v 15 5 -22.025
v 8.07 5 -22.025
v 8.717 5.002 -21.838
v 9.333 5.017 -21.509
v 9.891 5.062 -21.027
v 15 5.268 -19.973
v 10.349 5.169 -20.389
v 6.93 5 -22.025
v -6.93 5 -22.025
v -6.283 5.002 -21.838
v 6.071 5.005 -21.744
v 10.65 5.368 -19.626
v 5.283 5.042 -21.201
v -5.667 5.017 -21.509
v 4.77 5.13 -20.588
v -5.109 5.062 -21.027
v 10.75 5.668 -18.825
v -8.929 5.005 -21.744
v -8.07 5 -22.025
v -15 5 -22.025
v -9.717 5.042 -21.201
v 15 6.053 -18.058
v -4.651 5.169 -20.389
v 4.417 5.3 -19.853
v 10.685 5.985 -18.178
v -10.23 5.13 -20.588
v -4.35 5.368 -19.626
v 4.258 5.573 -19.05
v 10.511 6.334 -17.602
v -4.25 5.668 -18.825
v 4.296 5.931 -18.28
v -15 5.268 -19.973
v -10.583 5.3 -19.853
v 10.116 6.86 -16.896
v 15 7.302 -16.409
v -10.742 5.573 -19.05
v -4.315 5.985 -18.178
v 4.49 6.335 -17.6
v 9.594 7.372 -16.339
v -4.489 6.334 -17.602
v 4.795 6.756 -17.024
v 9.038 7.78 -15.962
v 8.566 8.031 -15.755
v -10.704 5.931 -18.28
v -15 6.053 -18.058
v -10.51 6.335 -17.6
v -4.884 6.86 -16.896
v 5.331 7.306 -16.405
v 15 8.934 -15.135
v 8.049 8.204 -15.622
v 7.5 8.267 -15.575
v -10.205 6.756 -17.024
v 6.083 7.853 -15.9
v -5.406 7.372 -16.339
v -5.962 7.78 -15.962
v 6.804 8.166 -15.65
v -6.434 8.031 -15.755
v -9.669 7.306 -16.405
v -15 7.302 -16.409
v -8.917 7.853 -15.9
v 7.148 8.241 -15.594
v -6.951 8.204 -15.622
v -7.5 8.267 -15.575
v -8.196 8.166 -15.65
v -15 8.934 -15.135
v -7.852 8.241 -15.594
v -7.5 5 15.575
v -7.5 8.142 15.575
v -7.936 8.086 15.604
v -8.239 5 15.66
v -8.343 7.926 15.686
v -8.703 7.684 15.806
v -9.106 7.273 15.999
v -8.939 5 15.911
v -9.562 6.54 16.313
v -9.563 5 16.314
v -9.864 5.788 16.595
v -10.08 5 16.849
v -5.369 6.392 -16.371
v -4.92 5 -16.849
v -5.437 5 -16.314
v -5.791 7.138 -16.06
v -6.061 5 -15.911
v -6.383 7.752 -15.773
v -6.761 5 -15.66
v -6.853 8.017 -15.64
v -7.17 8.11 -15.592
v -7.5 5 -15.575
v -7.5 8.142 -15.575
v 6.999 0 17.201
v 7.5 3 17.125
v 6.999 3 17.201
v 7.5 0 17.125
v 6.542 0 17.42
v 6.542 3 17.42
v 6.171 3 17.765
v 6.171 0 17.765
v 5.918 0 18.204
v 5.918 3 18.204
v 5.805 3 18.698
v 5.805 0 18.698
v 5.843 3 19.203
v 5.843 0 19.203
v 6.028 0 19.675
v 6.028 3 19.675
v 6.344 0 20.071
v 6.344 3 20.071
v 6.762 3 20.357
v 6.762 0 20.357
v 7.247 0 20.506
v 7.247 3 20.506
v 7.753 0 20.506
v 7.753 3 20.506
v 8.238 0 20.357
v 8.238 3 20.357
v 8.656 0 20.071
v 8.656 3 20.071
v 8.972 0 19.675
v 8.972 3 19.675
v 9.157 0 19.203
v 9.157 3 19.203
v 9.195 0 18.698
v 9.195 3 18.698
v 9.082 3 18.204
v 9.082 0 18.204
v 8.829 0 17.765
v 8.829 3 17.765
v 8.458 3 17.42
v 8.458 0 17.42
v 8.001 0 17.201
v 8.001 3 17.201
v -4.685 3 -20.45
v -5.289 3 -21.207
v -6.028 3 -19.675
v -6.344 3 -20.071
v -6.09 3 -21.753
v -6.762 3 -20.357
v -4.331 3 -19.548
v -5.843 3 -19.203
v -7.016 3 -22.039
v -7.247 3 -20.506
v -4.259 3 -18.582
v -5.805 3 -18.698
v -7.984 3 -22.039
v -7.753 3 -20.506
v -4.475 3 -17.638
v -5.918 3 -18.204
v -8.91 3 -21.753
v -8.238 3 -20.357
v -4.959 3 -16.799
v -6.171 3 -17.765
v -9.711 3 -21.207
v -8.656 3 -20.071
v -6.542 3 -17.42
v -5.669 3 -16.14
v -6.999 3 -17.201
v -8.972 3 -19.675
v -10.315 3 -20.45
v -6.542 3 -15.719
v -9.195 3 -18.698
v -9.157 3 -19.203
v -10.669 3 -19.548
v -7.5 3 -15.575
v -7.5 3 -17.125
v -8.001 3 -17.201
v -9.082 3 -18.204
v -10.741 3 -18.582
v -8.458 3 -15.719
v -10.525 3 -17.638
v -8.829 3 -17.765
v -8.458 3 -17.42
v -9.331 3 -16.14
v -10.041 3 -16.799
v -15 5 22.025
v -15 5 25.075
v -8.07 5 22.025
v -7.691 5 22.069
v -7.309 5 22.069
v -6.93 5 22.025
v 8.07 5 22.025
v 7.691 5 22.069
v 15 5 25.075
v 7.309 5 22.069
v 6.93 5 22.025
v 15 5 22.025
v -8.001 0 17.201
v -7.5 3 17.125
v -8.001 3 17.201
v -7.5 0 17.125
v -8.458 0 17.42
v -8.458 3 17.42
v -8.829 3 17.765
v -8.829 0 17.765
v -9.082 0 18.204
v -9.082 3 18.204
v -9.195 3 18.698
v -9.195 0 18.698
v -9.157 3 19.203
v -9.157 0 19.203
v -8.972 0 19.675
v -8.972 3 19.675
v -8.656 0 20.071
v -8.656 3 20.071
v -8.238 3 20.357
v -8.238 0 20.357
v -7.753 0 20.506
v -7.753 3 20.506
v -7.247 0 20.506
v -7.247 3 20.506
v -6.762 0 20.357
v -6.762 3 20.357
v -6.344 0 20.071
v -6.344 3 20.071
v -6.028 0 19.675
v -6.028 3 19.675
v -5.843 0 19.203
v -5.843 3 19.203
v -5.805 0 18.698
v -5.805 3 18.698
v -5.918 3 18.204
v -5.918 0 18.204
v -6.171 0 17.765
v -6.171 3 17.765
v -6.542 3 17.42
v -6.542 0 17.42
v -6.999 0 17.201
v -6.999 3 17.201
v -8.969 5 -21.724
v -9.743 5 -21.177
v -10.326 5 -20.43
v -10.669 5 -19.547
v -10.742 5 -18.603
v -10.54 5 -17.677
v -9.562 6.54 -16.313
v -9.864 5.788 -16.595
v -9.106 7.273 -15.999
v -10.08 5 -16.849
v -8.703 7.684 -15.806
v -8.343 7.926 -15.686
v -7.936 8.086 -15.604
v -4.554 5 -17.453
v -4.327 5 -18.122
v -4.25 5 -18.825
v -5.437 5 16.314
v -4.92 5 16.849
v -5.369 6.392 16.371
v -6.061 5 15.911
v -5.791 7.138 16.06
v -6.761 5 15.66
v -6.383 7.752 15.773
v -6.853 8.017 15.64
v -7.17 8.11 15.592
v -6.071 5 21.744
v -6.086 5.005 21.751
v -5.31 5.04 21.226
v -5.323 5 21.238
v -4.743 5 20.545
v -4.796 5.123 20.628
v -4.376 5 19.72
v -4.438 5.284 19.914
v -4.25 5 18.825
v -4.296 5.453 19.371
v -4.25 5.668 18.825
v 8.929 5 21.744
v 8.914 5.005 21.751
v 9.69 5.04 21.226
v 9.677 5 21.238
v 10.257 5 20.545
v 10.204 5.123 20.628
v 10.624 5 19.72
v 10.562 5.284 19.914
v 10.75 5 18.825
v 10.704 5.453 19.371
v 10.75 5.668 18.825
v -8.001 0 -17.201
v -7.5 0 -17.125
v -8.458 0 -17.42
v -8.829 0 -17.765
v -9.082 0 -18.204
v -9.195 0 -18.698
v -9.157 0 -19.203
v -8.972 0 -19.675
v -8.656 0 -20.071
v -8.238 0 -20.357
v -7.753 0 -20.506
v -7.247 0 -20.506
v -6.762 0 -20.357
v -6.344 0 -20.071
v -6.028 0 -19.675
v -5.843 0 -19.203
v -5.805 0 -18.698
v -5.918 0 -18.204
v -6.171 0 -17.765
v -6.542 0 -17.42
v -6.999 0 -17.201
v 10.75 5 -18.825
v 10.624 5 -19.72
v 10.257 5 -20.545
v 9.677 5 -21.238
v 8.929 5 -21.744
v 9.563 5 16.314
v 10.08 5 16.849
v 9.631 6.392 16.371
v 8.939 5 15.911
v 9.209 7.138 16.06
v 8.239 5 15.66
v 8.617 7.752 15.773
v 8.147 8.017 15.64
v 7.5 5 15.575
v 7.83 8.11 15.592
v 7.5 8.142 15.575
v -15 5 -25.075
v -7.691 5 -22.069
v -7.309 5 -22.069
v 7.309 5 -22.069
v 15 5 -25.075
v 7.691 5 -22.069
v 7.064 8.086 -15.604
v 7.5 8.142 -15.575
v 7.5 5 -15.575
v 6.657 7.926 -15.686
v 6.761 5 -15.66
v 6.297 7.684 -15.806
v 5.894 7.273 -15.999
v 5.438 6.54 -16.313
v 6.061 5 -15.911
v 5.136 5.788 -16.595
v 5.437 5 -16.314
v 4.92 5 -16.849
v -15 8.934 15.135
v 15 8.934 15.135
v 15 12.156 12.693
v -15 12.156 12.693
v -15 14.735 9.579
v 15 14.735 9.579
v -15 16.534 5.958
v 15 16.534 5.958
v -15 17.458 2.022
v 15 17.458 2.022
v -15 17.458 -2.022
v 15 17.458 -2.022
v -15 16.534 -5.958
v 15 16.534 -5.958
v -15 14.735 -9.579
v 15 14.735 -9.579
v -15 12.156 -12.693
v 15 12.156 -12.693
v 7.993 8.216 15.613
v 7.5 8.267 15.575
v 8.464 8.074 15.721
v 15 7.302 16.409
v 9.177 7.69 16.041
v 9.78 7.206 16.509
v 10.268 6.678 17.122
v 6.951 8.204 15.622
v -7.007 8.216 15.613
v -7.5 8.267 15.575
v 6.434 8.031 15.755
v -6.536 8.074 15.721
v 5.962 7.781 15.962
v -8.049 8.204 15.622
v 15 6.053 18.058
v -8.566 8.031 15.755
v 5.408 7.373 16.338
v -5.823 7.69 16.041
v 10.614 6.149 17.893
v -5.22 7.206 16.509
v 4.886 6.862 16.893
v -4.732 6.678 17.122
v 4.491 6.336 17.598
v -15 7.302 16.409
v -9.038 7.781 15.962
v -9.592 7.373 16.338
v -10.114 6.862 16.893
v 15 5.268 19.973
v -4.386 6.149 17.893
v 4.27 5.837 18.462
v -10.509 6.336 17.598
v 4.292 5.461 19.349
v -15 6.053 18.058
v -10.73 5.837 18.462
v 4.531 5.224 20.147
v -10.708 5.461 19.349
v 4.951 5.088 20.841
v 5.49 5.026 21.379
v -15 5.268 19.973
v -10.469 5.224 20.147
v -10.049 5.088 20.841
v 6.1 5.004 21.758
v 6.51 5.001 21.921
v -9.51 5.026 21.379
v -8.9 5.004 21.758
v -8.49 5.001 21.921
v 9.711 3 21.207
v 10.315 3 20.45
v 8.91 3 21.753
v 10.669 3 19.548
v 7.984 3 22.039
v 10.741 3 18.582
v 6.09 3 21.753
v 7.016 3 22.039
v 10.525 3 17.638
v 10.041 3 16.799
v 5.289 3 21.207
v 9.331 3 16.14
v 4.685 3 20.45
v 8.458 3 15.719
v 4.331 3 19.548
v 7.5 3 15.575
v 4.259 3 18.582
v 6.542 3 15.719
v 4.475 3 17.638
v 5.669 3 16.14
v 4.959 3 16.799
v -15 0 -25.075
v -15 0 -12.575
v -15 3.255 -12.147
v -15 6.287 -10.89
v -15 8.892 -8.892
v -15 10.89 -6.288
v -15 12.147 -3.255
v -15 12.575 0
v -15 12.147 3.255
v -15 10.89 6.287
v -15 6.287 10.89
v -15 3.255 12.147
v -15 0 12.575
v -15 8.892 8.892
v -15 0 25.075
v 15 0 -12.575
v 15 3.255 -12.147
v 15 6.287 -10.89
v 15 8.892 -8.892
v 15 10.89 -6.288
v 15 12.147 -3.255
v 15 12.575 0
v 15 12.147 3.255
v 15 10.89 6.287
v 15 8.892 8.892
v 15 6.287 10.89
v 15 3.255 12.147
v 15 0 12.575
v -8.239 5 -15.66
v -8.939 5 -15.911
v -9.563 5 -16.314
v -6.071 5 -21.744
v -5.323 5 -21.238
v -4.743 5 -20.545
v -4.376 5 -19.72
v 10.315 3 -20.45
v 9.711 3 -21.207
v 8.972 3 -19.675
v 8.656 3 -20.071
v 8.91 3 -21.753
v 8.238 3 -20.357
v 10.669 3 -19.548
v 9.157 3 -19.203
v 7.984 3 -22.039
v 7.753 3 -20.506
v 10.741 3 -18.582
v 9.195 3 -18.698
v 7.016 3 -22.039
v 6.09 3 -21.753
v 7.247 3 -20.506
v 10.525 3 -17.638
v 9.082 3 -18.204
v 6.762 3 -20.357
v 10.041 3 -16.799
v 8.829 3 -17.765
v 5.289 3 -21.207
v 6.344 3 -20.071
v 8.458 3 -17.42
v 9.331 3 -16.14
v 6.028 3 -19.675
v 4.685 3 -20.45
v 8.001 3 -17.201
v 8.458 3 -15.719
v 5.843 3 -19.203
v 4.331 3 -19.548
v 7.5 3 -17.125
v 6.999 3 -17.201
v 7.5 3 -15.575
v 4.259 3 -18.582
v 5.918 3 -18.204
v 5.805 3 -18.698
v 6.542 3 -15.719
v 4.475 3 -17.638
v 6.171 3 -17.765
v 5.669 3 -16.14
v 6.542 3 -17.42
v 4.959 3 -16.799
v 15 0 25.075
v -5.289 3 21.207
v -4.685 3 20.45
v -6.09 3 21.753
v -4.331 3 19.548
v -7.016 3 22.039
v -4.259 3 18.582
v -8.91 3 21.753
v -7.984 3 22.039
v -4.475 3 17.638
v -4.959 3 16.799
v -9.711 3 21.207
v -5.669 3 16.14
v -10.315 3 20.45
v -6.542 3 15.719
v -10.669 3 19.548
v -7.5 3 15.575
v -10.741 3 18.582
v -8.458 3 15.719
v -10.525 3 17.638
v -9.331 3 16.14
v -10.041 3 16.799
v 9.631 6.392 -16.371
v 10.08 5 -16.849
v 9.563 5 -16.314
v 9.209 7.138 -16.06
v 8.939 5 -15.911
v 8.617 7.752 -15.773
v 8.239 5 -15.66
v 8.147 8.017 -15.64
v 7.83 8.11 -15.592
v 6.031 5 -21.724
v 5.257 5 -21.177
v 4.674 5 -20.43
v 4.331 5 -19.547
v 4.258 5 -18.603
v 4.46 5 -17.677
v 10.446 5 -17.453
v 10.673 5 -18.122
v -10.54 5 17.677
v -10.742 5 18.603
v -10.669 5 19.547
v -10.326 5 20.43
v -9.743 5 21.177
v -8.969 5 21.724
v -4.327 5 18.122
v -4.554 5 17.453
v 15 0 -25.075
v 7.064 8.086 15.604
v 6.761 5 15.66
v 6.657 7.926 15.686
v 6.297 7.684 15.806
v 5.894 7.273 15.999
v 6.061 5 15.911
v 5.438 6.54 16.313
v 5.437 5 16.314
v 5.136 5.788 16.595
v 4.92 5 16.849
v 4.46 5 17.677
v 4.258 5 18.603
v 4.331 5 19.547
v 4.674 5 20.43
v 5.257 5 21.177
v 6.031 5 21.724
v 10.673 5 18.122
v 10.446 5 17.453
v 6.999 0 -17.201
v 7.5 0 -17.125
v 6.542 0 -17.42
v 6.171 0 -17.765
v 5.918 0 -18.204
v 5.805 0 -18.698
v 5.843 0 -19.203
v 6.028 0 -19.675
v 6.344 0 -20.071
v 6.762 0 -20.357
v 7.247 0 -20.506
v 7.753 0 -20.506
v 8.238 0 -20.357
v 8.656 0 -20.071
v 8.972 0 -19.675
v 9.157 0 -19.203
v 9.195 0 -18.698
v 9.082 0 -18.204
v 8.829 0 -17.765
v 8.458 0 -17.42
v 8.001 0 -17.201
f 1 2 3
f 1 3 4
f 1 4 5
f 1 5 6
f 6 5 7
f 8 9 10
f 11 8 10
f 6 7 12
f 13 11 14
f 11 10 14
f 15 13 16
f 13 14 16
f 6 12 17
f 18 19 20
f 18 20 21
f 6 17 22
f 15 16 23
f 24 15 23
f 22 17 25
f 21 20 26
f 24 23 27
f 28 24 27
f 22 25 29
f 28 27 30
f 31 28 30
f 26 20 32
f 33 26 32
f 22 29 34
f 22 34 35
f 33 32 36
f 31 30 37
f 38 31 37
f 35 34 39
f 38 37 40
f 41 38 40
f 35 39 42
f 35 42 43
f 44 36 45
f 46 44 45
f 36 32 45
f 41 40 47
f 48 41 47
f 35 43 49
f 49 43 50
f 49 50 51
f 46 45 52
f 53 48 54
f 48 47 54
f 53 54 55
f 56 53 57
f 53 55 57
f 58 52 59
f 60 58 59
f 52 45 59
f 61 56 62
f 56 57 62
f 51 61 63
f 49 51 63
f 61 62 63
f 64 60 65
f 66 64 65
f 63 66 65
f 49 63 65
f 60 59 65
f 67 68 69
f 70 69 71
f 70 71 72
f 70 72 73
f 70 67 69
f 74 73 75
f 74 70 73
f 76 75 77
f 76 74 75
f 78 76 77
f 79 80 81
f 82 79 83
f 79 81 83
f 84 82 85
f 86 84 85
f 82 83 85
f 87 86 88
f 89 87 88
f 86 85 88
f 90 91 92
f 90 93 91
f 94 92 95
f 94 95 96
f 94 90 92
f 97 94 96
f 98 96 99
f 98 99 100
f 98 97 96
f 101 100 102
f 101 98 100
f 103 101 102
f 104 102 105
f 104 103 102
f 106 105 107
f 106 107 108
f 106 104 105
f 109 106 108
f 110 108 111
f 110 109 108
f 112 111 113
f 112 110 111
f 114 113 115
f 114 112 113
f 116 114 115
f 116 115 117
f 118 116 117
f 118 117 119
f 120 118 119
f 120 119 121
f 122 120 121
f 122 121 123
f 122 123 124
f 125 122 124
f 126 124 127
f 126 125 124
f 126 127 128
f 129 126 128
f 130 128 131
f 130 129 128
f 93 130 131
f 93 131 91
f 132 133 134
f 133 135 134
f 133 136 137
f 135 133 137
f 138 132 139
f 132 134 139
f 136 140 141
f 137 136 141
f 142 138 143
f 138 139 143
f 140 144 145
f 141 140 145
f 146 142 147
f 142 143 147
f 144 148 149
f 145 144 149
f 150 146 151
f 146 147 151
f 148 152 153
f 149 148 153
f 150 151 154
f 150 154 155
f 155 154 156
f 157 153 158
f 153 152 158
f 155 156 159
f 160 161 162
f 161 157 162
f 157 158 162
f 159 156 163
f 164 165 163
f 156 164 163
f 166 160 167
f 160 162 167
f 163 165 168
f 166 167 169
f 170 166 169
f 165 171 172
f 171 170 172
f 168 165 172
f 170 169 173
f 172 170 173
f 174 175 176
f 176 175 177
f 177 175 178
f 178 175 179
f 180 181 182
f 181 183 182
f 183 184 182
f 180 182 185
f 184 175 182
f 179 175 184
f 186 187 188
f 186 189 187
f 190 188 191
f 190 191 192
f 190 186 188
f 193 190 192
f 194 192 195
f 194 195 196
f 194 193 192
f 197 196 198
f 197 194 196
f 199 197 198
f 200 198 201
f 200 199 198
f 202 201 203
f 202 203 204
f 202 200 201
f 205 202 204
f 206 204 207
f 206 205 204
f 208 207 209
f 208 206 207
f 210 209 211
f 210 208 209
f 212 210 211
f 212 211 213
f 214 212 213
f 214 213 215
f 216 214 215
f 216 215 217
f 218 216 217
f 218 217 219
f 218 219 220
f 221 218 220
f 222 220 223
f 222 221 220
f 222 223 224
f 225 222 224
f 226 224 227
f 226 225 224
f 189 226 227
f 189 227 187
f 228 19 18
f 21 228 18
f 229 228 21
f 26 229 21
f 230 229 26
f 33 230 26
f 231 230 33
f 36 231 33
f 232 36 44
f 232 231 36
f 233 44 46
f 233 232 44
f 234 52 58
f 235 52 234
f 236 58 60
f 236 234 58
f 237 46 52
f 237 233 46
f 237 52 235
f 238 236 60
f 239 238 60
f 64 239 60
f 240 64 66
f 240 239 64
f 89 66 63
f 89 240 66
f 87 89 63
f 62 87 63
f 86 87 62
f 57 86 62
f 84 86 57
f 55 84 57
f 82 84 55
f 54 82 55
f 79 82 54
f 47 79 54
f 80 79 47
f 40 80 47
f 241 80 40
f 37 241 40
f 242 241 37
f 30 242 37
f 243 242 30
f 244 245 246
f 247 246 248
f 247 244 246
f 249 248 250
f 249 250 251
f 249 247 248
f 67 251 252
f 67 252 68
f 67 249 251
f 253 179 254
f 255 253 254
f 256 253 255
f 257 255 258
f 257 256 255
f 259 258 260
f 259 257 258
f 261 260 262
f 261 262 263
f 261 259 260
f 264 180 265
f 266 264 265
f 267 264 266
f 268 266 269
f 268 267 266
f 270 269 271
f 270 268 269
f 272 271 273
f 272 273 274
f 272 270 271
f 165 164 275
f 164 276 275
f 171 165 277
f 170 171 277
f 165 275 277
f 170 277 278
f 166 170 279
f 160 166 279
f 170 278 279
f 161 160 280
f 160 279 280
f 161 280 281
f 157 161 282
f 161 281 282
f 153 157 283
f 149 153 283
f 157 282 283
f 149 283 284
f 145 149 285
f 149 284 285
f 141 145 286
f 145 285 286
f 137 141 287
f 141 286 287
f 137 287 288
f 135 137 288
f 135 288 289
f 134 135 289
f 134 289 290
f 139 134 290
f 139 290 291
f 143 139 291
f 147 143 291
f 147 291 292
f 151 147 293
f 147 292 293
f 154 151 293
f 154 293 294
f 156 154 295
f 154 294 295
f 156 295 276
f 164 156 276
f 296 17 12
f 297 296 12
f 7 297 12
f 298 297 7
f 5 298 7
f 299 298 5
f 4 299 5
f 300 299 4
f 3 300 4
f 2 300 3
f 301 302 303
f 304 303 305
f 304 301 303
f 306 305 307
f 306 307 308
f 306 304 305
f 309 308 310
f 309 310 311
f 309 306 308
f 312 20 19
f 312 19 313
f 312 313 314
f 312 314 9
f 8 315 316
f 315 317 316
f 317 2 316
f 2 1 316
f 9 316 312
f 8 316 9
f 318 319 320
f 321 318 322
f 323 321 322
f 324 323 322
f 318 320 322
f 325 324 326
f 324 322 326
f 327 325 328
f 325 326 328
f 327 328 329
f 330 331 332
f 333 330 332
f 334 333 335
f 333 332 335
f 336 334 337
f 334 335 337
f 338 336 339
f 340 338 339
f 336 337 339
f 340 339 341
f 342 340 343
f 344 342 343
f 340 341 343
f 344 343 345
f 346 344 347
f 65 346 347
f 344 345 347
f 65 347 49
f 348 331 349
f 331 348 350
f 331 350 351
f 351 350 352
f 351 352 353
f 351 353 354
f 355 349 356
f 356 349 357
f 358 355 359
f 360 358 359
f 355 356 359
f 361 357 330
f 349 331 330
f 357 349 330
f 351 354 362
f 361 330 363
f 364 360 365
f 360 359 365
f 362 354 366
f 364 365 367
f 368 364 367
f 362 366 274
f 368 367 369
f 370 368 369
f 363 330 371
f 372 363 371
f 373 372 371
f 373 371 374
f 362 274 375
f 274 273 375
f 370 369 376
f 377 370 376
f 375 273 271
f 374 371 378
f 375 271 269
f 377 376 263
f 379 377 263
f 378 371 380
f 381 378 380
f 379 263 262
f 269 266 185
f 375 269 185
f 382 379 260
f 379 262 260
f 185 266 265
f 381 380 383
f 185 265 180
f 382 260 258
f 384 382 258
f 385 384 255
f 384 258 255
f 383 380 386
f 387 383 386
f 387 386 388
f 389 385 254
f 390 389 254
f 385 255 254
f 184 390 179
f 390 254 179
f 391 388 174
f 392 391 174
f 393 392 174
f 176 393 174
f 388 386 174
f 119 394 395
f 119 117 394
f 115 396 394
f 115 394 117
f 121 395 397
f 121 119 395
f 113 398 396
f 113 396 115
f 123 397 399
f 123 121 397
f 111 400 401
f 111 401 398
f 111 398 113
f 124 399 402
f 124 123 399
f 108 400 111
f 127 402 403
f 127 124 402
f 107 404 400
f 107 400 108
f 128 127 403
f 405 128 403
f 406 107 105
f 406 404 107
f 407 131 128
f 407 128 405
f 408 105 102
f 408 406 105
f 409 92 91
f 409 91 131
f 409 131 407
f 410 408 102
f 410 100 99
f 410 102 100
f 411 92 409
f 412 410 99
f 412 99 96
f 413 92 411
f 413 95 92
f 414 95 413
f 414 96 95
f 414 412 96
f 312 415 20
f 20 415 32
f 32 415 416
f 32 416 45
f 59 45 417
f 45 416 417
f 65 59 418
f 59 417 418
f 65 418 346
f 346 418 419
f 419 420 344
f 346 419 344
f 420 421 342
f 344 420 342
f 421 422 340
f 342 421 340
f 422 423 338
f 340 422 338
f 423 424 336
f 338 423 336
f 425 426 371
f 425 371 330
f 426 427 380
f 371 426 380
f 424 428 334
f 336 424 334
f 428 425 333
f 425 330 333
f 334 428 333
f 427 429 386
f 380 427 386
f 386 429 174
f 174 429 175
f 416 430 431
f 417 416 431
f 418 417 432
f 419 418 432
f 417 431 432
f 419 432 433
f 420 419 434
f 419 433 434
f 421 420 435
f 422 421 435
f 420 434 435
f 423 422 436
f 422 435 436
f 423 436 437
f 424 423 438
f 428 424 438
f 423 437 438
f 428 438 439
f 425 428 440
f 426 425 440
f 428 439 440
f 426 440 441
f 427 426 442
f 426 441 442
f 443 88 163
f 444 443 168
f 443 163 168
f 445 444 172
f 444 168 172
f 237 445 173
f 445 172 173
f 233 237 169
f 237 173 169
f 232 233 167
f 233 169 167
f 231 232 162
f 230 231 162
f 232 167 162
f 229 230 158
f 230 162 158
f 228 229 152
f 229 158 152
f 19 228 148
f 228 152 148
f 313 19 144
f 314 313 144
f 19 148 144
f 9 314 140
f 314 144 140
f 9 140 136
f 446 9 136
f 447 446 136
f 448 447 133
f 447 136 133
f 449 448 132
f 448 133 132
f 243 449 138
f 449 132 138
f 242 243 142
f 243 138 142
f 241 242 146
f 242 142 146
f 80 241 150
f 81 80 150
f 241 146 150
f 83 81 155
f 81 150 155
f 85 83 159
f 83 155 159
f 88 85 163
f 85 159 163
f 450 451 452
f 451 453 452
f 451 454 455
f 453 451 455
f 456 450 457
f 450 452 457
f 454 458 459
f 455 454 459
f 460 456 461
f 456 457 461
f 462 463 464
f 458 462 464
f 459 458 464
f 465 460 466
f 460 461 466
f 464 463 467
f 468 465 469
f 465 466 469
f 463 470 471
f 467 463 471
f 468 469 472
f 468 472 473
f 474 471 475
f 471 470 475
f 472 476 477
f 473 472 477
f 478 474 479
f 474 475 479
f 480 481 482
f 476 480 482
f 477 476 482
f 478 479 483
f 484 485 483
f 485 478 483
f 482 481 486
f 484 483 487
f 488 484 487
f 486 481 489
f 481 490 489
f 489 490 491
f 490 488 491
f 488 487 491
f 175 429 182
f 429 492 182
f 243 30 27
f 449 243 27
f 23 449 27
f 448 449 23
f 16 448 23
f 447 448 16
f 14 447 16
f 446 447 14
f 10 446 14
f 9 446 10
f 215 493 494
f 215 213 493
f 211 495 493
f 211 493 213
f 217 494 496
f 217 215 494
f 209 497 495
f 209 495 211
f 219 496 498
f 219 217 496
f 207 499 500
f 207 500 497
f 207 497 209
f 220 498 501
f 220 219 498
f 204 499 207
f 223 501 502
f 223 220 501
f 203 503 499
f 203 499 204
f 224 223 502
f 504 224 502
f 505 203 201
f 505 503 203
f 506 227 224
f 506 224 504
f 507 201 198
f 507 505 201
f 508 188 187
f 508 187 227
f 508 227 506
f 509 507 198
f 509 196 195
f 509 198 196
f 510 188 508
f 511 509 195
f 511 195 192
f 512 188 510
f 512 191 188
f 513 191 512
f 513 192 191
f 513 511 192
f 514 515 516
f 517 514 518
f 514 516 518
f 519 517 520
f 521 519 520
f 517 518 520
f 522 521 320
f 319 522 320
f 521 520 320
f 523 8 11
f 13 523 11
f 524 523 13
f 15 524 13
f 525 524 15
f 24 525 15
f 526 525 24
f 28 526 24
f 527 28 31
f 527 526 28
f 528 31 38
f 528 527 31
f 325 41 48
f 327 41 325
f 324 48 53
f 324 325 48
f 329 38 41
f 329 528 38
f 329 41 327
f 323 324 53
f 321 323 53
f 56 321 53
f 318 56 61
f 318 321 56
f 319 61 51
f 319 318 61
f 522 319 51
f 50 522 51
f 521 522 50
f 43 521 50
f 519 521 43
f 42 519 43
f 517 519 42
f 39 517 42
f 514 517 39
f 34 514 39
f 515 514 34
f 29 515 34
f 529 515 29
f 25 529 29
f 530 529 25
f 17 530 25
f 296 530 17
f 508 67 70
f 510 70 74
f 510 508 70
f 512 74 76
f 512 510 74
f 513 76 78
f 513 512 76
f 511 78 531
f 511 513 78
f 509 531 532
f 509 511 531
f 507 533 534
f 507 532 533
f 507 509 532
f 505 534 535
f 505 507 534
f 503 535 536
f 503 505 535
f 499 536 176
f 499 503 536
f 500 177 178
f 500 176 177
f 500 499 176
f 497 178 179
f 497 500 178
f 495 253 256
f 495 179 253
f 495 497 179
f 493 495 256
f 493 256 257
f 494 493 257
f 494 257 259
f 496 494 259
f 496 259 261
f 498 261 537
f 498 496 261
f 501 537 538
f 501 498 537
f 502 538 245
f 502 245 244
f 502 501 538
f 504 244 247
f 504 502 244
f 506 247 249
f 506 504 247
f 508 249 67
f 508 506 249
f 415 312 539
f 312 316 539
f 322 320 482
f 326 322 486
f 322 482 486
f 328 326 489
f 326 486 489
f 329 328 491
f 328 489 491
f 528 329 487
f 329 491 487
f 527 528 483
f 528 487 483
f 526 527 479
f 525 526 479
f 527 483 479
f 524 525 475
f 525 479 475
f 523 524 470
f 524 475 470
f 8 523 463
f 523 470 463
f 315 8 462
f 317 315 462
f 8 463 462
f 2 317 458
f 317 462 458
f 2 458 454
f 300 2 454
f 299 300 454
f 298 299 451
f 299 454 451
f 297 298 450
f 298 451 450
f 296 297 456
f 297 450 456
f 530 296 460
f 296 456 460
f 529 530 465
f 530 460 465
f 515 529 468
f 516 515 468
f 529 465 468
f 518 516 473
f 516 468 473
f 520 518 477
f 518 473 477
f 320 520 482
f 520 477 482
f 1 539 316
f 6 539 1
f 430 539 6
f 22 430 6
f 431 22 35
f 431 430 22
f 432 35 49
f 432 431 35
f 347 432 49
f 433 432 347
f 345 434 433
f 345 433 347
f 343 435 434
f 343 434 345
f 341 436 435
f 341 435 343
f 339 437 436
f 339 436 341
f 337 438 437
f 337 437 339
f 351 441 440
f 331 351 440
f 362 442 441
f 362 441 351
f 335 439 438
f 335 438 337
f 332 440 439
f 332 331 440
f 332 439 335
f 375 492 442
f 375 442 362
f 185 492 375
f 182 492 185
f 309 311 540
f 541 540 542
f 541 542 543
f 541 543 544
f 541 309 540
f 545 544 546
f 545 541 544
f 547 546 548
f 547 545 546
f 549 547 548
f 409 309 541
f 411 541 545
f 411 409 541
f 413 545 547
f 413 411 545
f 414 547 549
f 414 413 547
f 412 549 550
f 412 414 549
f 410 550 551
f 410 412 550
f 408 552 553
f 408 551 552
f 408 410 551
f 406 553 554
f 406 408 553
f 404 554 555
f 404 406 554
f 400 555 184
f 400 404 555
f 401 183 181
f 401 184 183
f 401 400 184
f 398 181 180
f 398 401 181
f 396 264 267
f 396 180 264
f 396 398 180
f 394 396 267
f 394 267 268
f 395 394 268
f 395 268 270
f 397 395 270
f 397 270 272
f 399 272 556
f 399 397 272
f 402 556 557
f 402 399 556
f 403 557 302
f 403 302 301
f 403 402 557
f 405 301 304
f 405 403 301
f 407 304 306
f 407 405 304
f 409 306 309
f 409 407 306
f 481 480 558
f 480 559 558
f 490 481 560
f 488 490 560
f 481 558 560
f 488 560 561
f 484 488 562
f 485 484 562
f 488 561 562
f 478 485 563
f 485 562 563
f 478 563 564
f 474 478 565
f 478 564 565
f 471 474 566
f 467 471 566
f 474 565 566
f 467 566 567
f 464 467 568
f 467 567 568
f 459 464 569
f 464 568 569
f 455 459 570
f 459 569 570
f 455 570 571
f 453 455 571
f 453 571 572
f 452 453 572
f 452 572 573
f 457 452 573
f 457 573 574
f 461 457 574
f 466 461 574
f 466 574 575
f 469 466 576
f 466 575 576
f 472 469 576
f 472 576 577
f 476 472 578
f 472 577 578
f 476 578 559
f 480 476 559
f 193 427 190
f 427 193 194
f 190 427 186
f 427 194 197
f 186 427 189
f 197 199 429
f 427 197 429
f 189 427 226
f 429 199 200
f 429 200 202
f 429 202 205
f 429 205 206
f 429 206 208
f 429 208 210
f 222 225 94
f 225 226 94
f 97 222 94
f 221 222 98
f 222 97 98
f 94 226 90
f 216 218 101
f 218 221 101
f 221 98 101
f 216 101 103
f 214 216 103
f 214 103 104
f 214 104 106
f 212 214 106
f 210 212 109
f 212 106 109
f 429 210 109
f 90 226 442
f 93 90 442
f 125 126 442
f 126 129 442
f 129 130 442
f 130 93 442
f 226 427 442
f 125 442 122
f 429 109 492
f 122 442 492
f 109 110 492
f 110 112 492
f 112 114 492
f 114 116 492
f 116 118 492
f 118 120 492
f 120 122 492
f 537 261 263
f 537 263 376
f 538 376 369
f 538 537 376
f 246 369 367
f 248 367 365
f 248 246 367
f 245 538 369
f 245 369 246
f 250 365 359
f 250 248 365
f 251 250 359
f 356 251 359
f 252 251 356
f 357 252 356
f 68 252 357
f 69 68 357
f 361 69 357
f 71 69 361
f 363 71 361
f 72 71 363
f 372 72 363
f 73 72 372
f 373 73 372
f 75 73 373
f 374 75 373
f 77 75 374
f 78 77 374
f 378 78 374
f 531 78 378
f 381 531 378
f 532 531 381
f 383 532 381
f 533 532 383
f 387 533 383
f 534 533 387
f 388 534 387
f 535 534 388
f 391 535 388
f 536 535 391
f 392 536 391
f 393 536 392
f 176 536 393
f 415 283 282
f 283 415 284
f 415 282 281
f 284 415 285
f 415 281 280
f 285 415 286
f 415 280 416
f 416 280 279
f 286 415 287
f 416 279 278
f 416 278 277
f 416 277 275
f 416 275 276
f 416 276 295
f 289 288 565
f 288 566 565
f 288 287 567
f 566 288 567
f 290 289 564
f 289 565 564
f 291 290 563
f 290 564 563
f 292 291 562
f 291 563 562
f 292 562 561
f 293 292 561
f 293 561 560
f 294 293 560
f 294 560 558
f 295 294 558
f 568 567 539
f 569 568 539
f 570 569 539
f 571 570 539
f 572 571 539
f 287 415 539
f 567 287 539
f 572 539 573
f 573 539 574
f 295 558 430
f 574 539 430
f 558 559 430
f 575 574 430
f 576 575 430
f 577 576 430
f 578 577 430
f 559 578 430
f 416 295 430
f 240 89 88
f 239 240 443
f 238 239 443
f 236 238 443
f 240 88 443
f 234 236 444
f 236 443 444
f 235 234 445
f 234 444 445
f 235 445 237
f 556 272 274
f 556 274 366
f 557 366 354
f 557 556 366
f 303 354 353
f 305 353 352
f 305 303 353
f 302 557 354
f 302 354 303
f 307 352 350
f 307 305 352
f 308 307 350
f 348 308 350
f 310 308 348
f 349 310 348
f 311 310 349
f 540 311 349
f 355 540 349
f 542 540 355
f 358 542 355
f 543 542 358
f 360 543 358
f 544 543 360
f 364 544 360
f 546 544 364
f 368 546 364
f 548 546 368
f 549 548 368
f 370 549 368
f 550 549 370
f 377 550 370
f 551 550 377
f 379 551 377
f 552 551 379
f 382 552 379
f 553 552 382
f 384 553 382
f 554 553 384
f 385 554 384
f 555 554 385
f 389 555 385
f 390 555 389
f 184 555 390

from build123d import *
from build123d.topology import SkipClean

# Parameters (mm, degrees)
BOSS_EXTRUDE1_DEPTH           = 15
CBORE_FOR_M3_SHCS1_AT_2_COUNT = 2
CBORE_FOR_M3_SHCS1_AT_2_PITCH = 15
FILLET1_START                 = -15
FILLET1_DEPTH                 = 30
FILLET1_START_2               = 5
FILLET1_2_OUTLINE_R           = 3.25
FILLET1_2_DEPTH               = 3.266781676


with BuildPart() as part:
    # Sketch1 → Boss-Extrude1 (new, symmetric)
    with BuildSketch(Plane(origin=(0, 0, 0), x_dir=(0, 0, -1), z_dir=(1, 0, 0))):
        with BuildLine():
            Line((-12.575, 0), (-25.075, 0))
            Line((-25.075, 0), (-25.075, 5))
            Line((-25.075, 5), (-16.848757373, 5))
            ThreePointArc((-16.848757373, 5), (0, 17.575), (16.848757373, 5))
            Line((16.848757373, 5), (25.075, 5))
            Line((25.075, 5), (25.075, 0))
            Line((25.075, 0), (12.575, 0))
            ThreePointArc((12.575, 0), (0, 12.575), (-12.575, 0))
        make_face()
    extrude(amount=BOSS_EXTRUDE1_DEPTH, both=True)

    # Sketch4 → CBORE for M3 SHCS1 (revolve, cut)
    with BuildSketch(Plane(origin=(7.5, 0, 18.825), x_dir=(0, 0, -1), z_dir=(1, 0, 0))):
        Polygon((0, 0), (0, 17.575), (3.25, 17.575), (3.25, 3), (1.7, 3), (1.7, 0), align=None)
    cbore_for_m3_shcs1 = revolve(axis=Axis((7.5, -6.35, 18.825), (0, 1, 0)), mode=Mode.SUBTRACT)

    # CBORE for M3 SHCS1 at 2: CBORE for M3 SHCS1 ×2
    with Locations(*[(-i * CBORE_FOR_M3_SHCS1_AT_2_PITCH, 0, 0) for i in range(1, CBORE_FOR_M3_SHCS1_AT_2_COUNT)]):
        add(cbore_for_m3_shcs1, mode=Mode.SUBTRACT)

    # Mirror1: CBORE for M3 SHCS1 across plane
    add(cbore_for_m3_shcs1.mirror(Plane.XY), mode=Mode.SUBTRACT)

    # Mirror1 copy 1 sketch → Mirror1 copy 1 (revolve, cut)
    with BuildSketch(Plane(origin=(-7.5, 0, -18.825), x_dir=(0, 0, 1), z_dir=(1, 0, 0))):
        Polygon((0, 0), (0, -17.575), (3.25, -17.575), (3.25, -3), (1.7, -3), (1.7, 0), align=None)
    revolve(axis=Axis((-7.5, -6.35, -18.825), (0, -1, 0)), mode=Mode.SUBTRACT)

    # Fillet1: read off the stored shape, not the designer's step
    # Fillet1 outline → Fillet1 (add)
    with BuildSketch(Plane.YZ.offset(FILLET1_START)):
        with BuildLine():
            Line((5, -16.848757373), (5, -22.024545966))
            ThreePointArc((5, -22.024545966), (6.052634697, -18.057920782), (8.933528837, -15.135147423))
            ThreePointArc((8.933528837, -15.135147423), (7.019253609, -16.112439411), (5, -16.848757373))
        make_face()
        with BuildLine():
            ThreePointArc((5, 16.848757373), (7.019253609, 16.112439411), (8.933528837, 15.135147423))
            ThreePointArc((8.933528837, 15.135147423), (6.052634697, 18.057920782), (5, 22.024545966))
            Line((5, 22.024545966), (5, 16.848757373))
        make_face()
    extrude(amount=FILLET1_DEPTH)

    # Fillet1 2 outline → Fillet1 2 (cut)
    with SkipClean():  # the faces are left unmerged after this step: merging them gives an invalid solid
        with BuildSketch(Plane(origin=(0, 0, 0), x_dir=(1, 0, 0), z_dir=(0, 1, 0)).offset(FILLET1_START_2)):
            with Locations((7.5, 18.825)):
                Circle(FILLET1_2_OUTLINE_R)
            with Locations((-7.5, 18.825)):
                Circle(FILLET1_2_OUTLINE_R)
            with Locations((7.5, -18.825)):
                Circle(FILLET1_2_OUTLINE_R)
            with Locations((-7.5, -18.825)):
                Circle(FILLET1_2_OUTLINE_R)
        extrude(amount=FILLET1_2_DEPTH, mode=Mode.SUBTRACT)


solid = part.part
